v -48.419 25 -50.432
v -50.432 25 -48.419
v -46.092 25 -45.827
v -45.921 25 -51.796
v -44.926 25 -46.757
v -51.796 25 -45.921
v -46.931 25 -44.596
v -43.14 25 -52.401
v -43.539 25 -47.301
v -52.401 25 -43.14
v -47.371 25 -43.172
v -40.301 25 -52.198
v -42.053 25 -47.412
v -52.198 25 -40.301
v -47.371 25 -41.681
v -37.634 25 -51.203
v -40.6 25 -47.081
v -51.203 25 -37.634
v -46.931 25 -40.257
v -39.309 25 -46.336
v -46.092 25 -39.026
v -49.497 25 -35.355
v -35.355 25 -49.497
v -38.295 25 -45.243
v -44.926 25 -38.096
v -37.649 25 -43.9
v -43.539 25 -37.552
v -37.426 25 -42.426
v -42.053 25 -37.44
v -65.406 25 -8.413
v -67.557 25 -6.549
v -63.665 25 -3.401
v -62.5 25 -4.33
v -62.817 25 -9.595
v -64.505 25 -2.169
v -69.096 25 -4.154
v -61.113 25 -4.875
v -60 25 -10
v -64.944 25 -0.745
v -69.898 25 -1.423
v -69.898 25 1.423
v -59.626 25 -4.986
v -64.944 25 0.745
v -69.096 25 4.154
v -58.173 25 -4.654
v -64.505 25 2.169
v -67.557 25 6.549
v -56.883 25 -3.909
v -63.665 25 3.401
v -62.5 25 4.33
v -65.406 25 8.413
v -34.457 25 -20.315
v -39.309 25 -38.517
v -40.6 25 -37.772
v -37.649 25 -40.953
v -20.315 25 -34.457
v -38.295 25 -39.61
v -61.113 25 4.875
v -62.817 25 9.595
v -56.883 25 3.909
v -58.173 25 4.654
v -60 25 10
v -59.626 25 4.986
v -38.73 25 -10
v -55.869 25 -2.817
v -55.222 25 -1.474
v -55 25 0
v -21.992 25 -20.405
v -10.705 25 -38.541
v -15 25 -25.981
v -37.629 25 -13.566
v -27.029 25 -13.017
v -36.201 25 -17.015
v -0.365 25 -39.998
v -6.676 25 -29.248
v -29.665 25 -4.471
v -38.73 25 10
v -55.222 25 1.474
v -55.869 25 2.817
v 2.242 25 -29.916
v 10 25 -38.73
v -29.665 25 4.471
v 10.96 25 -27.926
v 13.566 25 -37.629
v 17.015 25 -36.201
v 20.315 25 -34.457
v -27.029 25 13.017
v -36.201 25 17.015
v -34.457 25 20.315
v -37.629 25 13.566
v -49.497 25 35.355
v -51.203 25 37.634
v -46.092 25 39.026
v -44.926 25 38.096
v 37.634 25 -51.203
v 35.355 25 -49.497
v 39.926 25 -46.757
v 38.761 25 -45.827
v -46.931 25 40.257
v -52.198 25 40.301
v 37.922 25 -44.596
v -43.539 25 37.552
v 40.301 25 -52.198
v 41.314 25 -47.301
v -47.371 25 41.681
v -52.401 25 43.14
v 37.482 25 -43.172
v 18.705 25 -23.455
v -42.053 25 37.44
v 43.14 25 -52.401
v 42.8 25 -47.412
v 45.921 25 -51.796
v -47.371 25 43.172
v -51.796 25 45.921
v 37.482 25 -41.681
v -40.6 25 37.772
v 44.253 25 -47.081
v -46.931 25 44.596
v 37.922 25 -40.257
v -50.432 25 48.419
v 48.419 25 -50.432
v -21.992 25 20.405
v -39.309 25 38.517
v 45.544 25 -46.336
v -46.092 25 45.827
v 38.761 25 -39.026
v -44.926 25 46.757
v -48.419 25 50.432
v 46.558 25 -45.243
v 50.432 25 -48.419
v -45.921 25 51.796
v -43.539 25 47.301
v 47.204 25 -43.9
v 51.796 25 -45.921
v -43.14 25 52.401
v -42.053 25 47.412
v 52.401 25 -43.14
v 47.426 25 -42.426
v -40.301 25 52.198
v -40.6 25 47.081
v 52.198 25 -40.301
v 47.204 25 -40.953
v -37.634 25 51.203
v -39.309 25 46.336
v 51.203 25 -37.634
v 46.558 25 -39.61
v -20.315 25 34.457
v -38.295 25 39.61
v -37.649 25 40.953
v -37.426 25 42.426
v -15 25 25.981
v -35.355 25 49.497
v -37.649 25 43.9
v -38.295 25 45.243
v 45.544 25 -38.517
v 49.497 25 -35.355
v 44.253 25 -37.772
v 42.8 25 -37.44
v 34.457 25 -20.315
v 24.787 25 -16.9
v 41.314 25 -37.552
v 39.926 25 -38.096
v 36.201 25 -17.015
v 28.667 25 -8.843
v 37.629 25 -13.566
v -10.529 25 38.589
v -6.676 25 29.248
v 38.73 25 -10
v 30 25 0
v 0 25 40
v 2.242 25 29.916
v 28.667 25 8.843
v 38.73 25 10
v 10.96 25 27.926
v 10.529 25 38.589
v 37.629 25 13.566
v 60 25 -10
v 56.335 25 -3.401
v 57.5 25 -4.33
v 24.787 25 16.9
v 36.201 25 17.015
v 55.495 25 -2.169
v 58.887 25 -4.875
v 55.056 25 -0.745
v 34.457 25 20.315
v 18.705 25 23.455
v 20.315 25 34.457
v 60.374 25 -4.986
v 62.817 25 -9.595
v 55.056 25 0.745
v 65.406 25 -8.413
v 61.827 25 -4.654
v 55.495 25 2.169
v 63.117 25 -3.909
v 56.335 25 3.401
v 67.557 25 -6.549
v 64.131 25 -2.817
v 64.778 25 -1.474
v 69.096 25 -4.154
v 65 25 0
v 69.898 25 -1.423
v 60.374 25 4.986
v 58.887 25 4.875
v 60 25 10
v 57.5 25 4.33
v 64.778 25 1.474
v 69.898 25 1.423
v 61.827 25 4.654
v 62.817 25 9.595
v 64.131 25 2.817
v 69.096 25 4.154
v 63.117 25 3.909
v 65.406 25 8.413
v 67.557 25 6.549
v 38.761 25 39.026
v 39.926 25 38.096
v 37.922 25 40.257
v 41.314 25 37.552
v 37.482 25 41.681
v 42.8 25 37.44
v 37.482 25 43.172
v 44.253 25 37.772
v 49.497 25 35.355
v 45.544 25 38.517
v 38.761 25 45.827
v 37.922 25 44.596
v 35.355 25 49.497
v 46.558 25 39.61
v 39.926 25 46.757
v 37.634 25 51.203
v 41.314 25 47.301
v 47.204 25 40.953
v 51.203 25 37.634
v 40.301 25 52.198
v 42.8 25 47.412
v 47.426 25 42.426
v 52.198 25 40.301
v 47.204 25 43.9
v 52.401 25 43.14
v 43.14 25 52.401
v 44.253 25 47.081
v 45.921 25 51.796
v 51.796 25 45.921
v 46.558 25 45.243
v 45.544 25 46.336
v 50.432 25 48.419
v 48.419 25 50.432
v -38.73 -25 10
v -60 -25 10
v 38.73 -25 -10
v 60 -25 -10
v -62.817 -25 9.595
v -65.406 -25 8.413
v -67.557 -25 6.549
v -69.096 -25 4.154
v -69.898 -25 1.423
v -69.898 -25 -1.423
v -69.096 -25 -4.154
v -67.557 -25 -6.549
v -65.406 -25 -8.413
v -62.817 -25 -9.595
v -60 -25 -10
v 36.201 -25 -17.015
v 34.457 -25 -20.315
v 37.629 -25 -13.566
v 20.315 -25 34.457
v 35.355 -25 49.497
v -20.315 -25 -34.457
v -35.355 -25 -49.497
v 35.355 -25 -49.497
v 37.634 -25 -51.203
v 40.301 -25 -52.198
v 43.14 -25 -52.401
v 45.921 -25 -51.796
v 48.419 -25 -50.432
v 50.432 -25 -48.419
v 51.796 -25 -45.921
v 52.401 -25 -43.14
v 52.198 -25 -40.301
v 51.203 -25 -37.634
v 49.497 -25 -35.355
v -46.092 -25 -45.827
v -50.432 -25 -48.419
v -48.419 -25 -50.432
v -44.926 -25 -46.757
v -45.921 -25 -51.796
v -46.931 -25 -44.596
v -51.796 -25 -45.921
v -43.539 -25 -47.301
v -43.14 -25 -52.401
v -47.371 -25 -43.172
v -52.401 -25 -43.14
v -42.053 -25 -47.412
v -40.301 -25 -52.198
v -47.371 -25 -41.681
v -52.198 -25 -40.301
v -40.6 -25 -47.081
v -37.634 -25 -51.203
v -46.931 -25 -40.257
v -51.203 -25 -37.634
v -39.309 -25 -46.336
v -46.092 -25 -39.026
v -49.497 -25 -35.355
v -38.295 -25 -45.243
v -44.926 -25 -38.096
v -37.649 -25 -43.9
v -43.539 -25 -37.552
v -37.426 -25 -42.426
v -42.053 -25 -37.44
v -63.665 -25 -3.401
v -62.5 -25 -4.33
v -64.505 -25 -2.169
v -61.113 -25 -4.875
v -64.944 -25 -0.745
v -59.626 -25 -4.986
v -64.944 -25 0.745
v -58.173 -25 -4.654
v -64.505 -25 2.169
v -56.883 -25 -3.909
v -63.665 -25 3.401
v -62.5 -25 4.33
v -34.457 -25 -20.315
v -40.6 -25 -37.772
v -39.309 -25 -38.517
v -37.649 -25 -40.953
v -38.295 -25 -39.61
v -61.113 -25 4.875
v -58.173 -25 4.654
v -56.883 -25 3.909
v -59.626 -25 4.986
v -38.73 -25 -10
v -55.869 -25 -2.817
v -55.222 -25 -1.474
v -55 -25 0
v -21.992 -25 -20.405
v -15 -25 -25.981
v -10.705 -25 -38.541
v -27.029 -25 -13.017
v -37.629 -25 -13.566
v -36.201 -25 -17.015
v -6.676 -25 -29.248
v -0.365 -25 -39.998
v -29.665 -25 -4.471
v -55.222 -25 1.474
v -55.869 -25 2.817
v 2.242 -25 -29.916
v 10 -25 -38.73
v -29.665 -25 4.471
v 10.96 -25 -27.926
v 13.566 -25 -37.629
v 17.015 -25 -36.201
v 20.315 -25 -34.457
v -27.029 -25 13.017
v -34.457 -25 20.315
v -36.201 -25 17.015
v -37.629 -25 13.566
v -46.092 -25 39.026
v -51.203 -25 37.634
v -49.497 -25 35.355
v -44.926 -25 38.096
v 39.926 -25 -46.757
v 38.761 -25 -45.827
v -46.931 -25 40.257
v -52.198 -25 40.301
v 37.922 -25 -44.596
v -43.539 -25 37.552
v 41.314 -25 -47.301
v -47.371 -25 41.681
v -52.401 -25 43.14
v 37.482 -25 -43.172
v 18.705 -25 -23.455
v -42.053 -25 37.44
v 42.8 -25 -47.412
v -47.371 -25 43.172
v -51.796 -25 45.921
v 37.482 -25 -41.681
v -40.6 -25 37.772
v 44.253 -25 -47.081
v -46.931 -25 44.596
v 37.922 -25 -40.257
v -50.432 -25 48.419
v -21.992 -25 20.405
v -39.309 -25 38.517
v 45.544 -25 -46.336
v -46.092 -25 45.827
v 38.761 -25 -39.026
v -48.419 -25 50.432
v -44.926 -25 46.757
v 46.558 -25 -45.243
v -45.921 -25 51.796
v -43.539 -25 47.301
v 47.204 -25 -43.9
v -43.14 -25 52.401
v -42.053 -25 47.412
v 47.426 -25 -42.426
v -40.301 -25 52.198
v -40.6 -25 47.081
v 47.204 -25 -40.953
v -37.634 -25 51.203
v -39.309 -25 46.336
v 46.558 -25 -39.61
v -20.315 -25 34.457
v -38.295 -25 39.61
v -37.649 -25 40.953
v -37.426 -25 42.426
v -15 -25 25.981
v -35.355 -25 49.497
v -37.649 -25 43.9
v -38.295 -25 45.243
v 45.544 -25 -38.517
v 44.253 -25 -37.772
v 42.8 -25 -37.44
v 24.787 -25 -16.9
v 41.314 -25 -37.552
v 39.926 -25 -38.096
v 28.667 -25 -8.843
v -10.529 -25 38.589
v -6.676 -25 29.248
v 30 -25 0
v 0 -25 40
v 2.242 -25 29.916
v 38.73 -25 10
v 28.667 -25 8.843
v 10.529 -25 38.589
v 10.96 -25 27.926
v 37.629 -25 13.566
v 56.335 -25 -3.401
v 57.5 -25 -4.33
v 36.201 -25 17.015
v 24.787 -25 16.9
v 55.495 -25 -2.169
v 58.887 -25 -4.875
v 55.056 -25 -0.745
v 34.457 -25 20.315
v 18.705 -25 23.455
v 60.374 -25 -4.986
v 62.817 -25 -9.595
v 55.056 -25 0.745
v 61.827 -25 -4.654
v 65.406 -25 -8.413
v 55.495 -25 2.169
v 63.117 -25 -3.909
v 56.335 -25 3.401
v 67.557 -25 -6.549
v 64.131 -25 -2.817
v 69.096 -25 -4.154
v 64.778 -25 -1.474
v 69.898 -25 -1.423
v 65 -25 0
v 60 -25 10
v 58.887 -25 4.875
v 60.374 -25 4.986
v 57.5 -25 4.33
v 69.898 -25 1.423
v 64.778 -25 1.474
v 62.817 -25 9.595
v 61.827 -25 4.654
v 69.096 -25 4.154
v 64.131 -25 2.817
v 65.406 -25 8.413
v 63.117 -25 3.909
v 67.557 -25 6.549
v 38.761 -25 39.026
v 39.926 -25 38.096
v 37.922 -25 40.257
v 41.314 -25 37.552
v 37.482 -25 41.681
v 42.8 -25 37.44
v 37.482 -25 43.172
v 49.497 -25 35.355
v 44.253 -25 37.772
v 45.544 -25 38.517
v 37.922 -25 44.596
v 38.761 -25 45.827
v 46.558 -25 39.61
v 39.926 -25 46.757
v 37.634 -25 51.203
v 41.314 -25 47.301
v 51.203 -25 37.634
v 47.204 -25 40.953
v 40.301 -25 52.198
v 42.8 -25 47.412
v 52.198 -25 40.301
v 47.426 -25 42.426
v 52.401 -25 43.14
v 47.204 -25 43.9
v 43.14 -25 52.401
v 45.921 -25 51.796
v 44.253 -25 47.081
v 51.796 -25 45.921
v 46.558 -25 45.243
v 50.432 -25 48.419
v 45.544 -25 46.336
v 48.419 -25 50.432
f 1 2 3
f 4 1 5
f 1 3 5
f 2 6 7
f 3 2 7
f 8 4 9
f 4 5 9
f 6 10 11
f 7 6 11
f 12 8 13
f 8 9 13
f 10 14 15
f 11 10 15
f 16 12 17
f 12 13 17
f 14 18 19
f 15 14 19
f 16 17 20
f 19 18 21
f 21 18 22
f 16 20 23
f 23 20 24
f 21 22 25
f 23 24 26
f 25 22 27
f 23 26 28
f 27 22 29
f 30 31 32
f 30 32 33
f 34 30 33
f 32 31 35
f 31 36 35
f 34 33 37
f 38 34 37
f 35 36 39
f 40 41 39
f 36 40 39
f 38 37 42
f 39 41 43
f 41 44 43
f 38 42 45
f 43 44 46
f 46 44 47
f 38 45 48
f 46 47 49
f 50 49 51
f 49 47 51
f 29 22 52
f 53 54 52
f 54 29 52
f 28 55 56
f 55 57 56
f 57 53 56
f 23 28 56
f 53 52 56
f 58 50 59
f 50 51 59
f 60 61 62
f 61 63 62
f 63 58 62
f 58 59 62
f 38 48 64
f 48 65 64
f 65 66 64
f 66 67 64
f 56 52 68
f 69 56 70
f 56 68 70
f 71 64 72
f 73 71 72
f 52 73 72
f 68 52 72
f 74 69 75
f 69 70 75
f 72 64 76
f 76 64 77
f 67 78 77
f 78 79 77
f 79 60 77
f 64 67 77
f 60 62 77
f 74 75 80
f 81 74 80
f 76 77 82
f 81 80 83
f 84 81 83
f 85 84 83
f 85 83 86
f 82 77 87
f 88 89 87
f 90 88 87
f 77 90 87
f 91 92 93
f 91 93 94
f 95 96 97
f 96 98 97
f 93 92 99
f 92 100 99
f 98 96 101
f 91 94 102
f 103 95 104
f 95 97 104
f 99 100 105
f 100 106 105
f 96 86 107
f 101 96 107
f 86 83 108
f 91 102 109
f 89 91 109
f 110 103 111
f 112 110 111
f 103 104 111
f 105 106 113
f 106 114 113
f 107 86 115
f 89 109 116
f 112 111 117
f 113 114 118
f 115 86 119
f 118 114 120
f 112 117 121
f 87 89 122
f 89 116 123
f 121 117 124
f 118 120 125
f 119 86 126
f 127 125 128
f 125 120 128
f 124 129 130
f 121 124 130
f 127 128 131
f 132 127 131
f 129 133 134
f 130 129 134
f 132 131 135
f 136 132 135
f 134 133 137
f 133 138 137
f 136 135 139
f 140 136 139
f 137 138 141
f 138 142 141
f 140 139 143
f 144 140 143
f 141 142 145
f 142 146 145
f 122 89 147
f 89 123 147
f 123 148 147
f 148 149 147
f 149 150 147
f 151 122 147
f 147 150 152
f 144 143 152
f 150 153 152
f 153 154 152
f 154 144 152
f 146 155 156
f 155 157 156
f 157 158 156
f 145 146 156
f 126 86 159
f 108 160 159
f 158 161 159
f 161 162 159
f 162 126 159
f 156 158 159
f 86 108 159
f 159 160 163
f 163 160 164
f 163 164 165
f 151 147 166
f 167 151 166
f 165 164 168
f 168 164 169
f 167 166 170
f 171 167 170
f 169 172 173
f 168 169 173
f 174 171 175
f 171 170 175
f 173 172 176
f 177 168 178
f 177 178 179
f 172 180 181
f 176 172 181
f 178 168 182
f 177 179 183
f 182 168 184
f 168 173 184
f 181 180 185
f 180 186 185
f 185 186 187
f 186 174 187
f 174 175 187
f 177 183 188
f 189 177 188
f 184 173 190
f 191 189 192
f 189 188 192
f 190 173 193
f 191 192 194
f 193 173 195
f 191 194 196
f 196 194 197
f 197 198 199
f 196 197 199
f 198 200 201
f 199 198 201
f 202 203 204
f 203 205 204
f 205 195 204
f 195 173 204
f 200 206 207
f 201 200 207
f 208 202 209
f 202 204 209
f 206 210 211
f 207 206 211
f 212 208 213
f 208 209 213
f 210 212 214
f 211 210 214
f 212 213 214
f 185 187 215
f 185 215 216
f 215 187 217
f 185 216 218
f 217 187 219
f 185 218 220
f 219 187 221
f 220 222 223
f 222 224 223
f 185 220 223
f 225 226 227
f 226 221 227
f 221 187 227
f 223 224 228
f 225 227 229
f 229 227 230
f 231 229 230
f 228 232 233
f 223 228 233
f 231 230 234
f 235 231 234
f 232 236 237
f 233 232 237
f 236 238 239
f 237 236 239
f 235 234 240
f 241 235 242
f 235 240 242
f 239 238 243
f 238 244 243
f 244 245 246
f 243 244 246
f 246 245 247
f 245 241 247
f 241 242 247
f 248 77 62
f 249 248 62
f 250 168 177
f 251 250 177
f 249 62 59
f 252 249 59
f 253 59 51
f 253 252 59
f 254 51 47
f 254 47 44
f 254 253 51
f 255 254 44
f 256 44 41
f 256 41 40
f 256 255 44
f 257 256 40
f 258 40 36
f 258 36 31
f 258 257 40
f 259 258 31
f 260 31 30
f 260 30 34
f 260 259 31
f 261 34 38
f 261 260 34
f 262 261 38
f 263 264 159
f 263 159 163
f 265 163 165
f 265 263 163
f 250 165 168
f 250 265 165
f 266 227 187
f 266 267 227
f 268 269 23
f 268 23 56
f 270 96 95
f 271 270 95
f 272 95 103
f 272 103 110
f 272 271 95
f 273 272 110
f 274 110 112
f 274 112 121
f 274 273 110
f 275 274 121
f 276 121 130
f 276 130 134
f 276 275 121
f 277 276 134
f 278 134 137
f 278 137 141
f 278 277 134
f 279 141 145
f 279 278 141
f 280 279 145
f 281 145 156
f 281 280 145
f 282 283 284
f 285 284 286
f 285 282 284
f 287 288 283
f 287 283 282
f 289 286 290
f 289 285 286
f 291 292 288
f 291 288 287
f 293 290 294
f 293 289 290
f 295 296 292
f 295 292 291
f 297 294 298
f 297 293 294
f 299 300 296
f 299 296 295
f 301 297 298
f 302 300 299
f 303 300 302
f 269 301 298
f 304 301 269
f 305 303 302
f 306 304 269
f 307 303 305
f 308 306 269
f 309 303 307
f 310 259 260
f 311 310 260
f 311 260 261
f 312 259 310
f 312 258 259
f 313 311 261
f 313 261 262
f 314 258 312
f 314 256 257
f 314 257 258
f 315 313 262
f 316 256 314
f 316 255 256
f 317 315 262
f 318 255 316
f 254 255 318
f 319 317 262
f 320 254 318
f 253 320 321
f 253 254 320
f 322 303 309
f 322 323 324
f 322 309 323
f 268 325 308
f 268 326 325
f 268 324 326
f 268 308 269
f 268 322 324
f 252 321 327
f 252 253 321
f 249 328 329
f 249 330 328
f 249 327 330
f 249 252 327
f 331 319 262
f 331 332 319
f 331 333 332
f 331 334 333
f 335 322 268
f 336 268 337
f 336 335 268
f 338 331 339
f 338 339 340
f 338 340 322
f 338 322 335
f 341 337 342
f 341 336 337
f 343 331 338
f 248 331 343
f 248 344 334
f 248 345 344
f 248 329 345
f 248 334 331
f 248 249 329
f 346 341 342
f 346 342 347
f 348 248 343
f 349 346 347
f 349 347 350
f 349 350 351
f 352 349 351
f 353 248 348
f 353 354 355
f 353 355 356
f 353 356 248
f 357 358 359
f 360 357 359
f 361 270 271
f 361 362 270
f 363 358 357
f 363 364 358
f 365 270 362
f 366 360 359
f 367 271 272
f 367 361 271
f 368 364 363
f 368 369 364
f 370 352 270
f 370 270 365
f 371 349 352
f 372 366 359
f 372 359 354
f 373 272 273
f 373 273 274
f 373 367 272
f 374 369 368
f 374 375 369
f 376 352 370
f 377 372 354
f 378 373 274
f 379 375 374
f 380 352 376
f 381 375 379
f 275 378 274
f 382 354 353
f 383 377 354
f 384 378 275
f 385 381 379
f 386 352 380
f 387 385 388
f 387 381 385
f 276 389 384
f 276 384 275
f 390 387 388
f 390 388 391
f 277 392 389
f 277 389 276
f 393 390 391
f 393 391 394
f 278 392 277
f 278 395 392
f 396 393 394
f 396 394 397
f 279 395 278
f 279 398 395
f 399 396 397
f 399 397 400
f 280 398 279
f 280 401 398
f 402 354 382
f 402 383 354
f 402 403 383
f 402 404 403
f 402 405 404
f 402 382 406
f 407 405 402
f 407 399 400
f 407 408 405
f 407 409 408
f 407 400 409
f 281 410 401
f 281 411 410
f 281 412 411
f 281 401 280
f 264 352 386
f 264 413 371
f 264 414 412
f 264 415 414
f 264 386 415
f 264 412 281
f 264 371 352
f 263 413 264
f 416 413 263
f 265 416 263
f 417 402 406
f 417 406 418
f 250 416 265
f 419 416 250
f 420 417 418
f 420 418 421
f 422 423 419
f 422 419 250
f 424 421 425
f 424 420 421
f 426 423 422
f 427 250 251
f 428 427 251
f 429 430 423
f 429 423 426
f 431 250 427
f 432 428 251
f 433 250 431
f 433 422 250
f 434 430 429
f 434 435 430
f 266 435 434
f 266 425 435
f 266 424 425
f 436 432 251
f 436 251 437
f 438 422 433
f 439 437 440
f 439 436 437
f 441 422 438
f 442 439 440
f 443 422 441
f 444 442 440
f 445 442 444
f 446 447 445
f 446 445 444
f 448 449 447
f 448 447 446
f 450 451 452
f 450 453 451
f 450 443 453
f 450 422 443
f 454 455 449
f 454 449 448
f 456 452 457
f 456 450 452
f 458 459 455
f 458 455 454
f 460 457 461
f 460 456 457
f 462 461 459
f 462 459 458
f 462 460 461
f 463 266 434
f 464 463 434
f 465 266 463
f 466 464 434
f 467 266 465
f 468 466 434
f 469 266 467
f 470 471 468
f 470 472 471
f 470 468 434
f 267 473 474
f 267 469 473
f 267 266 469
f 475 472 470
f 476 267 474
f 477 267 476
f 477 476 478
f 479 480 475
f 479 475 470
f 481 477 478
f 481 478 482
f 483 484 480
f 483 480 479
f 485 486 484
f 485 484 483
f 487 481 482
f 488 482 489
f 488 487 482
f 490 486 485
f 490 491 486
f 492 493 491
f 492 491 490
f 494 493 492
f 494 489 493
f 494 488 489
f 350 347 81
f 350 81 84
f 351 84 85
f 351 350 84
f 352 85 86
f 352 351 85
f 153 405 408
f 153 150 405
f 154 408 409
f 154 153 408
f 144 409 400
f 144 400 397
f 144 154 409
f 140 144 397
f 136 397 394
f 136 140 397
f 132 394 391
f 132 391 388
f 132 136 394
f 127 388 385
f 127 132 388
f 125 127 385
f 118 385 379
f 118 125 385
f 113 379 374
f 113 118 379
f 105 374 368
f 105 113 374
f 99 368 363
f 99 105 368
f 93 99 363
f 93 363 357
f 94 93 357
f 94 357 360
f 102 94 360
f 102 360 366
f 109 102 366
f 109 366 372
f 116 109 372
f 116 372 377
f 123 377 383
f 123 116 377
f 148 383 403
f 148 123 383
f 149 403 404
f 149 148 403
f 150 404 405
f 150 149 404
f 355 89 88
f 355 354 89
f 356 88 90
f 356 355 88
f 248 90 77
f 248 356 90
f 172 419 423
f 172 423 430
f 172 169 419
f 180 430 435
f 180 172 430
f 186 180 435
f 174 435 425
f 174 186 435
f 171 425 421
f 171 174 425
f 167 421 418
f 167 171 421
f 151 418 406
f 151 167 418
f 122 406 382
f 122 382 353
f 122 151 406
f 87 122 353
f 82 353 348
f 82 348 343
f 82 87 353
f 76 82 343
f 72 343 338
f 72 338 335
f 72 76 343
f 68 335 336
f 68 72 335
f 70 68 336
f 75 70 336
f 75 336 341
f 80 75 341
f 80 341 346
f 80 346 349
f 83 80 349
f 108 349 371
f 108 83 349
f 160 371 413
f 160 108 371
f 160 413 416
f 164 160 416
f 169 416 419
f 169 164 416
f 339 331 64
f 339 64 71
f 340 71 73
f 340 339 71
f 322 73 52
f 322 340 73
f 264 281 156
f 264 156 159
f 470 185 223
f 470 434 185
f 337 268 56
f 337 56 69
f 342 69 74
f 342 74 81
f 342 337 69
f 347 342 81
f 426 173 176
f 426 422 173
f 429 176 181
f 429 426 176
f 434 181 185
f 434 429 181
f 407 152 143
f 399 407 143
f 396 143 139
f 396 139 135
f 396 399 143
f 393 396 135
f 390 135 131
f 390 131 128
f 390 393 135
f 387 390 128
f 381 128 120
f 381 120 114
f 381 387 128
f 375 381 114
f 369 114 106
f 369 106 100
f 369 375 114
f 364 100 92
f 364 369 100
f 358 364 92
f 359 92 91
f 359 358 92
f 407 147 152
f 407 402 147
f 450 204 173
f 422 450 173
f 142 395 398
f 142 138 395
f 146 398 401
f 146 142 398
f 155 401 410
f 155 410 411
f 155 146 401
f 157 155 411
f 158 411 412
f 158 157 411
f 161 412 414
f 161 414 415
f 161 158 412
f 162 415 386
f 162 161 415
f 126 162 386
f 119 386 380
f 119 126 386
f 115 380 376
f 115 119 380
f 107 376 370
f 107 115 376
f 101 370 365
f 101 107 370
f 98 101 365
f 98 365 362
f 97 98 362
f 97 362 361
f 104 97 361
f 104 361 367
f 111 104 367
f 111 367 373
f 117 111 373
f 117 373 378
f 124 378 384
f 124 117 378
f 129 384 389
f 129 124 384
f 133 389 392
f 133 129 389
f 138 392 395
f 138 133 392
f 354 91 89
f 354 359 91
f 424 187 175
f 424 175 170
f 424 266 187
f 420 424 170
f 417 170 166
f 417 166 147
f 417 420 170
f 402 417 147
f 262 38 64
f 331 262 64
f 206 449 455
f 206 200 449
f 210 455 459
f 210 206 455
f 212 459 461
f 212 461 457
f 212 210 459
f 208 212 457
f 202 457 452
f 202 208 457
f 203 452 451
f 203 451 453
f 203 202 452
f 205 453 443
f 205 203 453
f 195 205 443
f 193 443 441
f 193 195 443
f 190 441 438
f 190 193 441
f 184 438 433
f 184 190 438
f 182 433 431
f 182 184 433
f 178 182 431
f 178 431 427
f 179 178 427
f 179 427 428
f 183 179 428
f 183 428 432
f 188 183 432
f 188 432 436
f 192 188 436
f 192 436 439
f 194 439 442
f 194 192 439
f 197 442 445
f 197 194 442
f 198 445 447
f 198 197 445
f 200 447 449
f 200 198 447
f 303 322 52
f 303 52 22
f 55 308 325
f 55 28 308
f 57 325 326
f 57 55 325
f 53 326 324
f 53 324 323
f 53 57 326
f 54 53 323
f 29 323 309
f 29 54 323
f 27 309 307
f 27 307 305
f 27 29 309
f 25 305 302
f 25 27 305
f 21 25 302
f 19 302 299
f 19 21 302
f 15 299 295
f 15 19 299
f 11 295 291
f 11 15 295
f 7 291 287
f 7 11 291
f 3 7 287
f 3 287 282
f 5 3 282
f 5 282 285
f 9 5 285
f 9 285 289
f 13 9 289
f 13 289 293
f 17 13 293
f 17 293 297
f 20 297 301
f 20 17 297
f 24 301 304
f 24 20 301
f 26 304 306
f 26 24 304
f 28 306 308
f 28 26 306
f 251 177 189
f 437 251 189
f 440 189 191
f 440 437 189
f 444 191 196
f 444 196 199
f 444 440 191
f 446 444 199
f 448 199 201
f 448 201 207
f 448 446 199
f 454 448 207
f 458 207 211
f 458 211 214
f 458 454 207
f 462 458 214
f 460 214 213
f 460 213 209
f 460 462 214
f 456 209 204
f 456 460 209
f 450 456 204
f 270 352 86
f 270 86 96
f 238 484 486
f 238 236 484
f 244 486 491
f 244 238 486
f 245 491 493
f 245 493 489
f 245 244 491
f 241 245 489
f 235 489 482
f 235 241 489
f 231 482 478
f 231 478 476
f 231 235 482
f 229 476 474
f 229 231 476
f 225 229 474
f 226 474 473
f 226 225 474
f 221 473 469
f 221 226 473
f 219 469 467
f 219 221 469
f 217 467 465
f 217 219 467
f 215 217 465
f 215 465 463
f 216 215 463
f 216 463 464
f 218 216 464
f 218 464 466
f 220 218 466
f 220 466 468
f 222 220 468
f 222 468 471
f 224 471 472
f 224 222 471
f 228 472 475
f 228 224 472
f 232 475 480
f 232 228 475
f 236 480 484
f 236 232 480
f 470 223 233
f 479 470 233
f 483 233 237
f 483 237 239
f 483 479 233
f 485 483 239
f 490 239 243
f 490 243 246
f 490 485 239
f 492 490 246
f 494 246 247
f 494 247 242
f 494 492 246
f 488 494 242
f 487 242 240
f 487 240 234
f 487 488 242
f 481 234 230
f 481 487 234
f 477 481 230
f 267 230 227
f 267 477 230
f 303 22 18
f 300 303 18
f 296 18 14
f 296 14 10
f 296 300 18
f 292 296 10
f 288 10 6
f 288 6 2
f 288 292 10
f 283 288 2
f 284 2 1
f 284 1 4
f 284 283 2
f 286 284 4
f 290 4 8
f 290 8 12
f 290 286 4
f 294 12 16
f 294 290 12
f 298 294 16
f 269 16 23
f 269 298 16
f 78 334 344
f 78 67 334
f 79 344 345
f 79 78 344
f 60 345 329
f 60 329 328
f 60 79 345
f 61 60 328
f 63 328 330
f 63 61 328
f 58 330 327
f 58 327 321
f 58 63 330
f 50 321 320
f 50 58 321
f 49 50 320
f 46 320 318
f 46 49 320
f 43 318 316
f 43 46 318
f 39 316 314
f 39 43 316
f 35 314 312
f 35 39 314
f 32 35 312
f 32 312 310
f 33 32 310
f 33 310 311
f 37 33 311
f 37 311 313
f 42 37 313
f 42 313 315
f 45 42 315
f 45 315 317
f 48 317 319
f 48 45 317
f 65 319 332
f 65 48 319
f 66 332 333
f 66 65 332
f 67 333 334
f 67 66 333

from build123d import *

# Parameters (mm, degrees)
F0_R     = 5
F0_R_2   = 30
F1_DEPTH = 25


with BuildPart() as f1:
    # F0 (on Front) → F1 (new body, symmetric)
    with BuildSketch(Plane.XZ):
        with BuildLine():
            Line((-60, -10), (-38.729833, -10))
            ThreePointArc((-38.729833, -10), (-36.955181, -15.307337), (-34.457196, -20.31506))
            Line((-34.457196, -20.31506), (-49.497475, -35.355339))
            ThreePointArc((-49.497475, -35.355339), (-49.497475, -49.497475), (-35.355339, -49.497475))
            Line((-35.355339, -49.497475), (-20.31506, -34.457196))
            ThreePointArc((-20.31506, -34.457196), (-5.58247, -39.608535), (10, -38.729833))
            ThreePointArc((10, -38.729833), (15.307337, -36.955181), (20.31506, -34.457196))
            Line((20.31506, -34.457196), (35.355339, -49.497475))
            ThreePointArc((35.355339, -49.497475), (49.497475, -49.497475), (49.497475, -35.355339))
            Line((49.497475, -35.355339), (34.457196, -20.31506))
            ThreePointArc((34.457196, -20.31506), (36.955181, -15.307337), (38.729833, -10))
            Line((38.729833, -10), (60, -10))
            ThreePointArc((60, -10), (70, 0), (60, 10))
            Line((60, 10), (38.729833, 10))
            ThreePointArc((38.729833, 10), (36.955181, 15.307337), (34.457196, 20.31506))
            ThreePointArc((34.457196, 20.31506), (28.284271, 28.284271), (20.31506, 34.457196))
            ThreePointArc((20.31506, 34.457196), (0, 40), (-20.31506, 34.457196))
            Line((-20.31506, 34.457196), (-35.355339, 49.497475))
            ThreePointArc((-35.355339, 49.497475), (-49.497475, 49.497475), (-49.497475, 35.355339))
            Line((-49.497475, 35.355339), (-34.457196, 20.31506))
            ThreePointArc((-34.457196, 20.31506), (-36.955181, 15.307337), (-38.729833, 10))
            Line((-38.729833, 10), (-60, 10))
            ThreePointArc((-60, 10), (-70, 0), (-60, -10))
        make_face()
        with Locations((-42.426407, -42.426407)):
            Circle(F0_R, mode=Mode.SUBTRACT)
        with Locations((-60, 0)):
            Circle(F0_R, mode=Mode.SUBTRACT)
        with Locations((42.426407, -42.426407)):
            Circle(F0_R, mode=Mode.SUBTRACT)
        Circle(F0_R_2, mode=Mode.SUBTRACT)
        with Locations((60, 0)):
            Circle(F0_R, mode=Mode.SUBTRACT)
        with Locations((-42.426407, 42.426407)):
            Circle(F0_R, mode=Mode.SUBTRACT)
        with BuildLine():
            Line((35.355339, 49.497475), (20.31506, 34.457196))
            ThreePointArc((20.31506, 34.457196), (28.284271, 28.284271), (34.457196, 20.31506))
            Line((34.457196, 20.31506), (49.497475, 35.355339))
            ThreePointArc((49.497475, 35.355339), (49.497475, 49.497475), (35.355339, 49.497475))
        make_face()
        with Locations((42.426407, 42.426407)):
            Circle(F0_R, mode=Mode.SUBTRACT)
    extrude(amount=F1_DEPTH, both=True)


solid = f1.part
